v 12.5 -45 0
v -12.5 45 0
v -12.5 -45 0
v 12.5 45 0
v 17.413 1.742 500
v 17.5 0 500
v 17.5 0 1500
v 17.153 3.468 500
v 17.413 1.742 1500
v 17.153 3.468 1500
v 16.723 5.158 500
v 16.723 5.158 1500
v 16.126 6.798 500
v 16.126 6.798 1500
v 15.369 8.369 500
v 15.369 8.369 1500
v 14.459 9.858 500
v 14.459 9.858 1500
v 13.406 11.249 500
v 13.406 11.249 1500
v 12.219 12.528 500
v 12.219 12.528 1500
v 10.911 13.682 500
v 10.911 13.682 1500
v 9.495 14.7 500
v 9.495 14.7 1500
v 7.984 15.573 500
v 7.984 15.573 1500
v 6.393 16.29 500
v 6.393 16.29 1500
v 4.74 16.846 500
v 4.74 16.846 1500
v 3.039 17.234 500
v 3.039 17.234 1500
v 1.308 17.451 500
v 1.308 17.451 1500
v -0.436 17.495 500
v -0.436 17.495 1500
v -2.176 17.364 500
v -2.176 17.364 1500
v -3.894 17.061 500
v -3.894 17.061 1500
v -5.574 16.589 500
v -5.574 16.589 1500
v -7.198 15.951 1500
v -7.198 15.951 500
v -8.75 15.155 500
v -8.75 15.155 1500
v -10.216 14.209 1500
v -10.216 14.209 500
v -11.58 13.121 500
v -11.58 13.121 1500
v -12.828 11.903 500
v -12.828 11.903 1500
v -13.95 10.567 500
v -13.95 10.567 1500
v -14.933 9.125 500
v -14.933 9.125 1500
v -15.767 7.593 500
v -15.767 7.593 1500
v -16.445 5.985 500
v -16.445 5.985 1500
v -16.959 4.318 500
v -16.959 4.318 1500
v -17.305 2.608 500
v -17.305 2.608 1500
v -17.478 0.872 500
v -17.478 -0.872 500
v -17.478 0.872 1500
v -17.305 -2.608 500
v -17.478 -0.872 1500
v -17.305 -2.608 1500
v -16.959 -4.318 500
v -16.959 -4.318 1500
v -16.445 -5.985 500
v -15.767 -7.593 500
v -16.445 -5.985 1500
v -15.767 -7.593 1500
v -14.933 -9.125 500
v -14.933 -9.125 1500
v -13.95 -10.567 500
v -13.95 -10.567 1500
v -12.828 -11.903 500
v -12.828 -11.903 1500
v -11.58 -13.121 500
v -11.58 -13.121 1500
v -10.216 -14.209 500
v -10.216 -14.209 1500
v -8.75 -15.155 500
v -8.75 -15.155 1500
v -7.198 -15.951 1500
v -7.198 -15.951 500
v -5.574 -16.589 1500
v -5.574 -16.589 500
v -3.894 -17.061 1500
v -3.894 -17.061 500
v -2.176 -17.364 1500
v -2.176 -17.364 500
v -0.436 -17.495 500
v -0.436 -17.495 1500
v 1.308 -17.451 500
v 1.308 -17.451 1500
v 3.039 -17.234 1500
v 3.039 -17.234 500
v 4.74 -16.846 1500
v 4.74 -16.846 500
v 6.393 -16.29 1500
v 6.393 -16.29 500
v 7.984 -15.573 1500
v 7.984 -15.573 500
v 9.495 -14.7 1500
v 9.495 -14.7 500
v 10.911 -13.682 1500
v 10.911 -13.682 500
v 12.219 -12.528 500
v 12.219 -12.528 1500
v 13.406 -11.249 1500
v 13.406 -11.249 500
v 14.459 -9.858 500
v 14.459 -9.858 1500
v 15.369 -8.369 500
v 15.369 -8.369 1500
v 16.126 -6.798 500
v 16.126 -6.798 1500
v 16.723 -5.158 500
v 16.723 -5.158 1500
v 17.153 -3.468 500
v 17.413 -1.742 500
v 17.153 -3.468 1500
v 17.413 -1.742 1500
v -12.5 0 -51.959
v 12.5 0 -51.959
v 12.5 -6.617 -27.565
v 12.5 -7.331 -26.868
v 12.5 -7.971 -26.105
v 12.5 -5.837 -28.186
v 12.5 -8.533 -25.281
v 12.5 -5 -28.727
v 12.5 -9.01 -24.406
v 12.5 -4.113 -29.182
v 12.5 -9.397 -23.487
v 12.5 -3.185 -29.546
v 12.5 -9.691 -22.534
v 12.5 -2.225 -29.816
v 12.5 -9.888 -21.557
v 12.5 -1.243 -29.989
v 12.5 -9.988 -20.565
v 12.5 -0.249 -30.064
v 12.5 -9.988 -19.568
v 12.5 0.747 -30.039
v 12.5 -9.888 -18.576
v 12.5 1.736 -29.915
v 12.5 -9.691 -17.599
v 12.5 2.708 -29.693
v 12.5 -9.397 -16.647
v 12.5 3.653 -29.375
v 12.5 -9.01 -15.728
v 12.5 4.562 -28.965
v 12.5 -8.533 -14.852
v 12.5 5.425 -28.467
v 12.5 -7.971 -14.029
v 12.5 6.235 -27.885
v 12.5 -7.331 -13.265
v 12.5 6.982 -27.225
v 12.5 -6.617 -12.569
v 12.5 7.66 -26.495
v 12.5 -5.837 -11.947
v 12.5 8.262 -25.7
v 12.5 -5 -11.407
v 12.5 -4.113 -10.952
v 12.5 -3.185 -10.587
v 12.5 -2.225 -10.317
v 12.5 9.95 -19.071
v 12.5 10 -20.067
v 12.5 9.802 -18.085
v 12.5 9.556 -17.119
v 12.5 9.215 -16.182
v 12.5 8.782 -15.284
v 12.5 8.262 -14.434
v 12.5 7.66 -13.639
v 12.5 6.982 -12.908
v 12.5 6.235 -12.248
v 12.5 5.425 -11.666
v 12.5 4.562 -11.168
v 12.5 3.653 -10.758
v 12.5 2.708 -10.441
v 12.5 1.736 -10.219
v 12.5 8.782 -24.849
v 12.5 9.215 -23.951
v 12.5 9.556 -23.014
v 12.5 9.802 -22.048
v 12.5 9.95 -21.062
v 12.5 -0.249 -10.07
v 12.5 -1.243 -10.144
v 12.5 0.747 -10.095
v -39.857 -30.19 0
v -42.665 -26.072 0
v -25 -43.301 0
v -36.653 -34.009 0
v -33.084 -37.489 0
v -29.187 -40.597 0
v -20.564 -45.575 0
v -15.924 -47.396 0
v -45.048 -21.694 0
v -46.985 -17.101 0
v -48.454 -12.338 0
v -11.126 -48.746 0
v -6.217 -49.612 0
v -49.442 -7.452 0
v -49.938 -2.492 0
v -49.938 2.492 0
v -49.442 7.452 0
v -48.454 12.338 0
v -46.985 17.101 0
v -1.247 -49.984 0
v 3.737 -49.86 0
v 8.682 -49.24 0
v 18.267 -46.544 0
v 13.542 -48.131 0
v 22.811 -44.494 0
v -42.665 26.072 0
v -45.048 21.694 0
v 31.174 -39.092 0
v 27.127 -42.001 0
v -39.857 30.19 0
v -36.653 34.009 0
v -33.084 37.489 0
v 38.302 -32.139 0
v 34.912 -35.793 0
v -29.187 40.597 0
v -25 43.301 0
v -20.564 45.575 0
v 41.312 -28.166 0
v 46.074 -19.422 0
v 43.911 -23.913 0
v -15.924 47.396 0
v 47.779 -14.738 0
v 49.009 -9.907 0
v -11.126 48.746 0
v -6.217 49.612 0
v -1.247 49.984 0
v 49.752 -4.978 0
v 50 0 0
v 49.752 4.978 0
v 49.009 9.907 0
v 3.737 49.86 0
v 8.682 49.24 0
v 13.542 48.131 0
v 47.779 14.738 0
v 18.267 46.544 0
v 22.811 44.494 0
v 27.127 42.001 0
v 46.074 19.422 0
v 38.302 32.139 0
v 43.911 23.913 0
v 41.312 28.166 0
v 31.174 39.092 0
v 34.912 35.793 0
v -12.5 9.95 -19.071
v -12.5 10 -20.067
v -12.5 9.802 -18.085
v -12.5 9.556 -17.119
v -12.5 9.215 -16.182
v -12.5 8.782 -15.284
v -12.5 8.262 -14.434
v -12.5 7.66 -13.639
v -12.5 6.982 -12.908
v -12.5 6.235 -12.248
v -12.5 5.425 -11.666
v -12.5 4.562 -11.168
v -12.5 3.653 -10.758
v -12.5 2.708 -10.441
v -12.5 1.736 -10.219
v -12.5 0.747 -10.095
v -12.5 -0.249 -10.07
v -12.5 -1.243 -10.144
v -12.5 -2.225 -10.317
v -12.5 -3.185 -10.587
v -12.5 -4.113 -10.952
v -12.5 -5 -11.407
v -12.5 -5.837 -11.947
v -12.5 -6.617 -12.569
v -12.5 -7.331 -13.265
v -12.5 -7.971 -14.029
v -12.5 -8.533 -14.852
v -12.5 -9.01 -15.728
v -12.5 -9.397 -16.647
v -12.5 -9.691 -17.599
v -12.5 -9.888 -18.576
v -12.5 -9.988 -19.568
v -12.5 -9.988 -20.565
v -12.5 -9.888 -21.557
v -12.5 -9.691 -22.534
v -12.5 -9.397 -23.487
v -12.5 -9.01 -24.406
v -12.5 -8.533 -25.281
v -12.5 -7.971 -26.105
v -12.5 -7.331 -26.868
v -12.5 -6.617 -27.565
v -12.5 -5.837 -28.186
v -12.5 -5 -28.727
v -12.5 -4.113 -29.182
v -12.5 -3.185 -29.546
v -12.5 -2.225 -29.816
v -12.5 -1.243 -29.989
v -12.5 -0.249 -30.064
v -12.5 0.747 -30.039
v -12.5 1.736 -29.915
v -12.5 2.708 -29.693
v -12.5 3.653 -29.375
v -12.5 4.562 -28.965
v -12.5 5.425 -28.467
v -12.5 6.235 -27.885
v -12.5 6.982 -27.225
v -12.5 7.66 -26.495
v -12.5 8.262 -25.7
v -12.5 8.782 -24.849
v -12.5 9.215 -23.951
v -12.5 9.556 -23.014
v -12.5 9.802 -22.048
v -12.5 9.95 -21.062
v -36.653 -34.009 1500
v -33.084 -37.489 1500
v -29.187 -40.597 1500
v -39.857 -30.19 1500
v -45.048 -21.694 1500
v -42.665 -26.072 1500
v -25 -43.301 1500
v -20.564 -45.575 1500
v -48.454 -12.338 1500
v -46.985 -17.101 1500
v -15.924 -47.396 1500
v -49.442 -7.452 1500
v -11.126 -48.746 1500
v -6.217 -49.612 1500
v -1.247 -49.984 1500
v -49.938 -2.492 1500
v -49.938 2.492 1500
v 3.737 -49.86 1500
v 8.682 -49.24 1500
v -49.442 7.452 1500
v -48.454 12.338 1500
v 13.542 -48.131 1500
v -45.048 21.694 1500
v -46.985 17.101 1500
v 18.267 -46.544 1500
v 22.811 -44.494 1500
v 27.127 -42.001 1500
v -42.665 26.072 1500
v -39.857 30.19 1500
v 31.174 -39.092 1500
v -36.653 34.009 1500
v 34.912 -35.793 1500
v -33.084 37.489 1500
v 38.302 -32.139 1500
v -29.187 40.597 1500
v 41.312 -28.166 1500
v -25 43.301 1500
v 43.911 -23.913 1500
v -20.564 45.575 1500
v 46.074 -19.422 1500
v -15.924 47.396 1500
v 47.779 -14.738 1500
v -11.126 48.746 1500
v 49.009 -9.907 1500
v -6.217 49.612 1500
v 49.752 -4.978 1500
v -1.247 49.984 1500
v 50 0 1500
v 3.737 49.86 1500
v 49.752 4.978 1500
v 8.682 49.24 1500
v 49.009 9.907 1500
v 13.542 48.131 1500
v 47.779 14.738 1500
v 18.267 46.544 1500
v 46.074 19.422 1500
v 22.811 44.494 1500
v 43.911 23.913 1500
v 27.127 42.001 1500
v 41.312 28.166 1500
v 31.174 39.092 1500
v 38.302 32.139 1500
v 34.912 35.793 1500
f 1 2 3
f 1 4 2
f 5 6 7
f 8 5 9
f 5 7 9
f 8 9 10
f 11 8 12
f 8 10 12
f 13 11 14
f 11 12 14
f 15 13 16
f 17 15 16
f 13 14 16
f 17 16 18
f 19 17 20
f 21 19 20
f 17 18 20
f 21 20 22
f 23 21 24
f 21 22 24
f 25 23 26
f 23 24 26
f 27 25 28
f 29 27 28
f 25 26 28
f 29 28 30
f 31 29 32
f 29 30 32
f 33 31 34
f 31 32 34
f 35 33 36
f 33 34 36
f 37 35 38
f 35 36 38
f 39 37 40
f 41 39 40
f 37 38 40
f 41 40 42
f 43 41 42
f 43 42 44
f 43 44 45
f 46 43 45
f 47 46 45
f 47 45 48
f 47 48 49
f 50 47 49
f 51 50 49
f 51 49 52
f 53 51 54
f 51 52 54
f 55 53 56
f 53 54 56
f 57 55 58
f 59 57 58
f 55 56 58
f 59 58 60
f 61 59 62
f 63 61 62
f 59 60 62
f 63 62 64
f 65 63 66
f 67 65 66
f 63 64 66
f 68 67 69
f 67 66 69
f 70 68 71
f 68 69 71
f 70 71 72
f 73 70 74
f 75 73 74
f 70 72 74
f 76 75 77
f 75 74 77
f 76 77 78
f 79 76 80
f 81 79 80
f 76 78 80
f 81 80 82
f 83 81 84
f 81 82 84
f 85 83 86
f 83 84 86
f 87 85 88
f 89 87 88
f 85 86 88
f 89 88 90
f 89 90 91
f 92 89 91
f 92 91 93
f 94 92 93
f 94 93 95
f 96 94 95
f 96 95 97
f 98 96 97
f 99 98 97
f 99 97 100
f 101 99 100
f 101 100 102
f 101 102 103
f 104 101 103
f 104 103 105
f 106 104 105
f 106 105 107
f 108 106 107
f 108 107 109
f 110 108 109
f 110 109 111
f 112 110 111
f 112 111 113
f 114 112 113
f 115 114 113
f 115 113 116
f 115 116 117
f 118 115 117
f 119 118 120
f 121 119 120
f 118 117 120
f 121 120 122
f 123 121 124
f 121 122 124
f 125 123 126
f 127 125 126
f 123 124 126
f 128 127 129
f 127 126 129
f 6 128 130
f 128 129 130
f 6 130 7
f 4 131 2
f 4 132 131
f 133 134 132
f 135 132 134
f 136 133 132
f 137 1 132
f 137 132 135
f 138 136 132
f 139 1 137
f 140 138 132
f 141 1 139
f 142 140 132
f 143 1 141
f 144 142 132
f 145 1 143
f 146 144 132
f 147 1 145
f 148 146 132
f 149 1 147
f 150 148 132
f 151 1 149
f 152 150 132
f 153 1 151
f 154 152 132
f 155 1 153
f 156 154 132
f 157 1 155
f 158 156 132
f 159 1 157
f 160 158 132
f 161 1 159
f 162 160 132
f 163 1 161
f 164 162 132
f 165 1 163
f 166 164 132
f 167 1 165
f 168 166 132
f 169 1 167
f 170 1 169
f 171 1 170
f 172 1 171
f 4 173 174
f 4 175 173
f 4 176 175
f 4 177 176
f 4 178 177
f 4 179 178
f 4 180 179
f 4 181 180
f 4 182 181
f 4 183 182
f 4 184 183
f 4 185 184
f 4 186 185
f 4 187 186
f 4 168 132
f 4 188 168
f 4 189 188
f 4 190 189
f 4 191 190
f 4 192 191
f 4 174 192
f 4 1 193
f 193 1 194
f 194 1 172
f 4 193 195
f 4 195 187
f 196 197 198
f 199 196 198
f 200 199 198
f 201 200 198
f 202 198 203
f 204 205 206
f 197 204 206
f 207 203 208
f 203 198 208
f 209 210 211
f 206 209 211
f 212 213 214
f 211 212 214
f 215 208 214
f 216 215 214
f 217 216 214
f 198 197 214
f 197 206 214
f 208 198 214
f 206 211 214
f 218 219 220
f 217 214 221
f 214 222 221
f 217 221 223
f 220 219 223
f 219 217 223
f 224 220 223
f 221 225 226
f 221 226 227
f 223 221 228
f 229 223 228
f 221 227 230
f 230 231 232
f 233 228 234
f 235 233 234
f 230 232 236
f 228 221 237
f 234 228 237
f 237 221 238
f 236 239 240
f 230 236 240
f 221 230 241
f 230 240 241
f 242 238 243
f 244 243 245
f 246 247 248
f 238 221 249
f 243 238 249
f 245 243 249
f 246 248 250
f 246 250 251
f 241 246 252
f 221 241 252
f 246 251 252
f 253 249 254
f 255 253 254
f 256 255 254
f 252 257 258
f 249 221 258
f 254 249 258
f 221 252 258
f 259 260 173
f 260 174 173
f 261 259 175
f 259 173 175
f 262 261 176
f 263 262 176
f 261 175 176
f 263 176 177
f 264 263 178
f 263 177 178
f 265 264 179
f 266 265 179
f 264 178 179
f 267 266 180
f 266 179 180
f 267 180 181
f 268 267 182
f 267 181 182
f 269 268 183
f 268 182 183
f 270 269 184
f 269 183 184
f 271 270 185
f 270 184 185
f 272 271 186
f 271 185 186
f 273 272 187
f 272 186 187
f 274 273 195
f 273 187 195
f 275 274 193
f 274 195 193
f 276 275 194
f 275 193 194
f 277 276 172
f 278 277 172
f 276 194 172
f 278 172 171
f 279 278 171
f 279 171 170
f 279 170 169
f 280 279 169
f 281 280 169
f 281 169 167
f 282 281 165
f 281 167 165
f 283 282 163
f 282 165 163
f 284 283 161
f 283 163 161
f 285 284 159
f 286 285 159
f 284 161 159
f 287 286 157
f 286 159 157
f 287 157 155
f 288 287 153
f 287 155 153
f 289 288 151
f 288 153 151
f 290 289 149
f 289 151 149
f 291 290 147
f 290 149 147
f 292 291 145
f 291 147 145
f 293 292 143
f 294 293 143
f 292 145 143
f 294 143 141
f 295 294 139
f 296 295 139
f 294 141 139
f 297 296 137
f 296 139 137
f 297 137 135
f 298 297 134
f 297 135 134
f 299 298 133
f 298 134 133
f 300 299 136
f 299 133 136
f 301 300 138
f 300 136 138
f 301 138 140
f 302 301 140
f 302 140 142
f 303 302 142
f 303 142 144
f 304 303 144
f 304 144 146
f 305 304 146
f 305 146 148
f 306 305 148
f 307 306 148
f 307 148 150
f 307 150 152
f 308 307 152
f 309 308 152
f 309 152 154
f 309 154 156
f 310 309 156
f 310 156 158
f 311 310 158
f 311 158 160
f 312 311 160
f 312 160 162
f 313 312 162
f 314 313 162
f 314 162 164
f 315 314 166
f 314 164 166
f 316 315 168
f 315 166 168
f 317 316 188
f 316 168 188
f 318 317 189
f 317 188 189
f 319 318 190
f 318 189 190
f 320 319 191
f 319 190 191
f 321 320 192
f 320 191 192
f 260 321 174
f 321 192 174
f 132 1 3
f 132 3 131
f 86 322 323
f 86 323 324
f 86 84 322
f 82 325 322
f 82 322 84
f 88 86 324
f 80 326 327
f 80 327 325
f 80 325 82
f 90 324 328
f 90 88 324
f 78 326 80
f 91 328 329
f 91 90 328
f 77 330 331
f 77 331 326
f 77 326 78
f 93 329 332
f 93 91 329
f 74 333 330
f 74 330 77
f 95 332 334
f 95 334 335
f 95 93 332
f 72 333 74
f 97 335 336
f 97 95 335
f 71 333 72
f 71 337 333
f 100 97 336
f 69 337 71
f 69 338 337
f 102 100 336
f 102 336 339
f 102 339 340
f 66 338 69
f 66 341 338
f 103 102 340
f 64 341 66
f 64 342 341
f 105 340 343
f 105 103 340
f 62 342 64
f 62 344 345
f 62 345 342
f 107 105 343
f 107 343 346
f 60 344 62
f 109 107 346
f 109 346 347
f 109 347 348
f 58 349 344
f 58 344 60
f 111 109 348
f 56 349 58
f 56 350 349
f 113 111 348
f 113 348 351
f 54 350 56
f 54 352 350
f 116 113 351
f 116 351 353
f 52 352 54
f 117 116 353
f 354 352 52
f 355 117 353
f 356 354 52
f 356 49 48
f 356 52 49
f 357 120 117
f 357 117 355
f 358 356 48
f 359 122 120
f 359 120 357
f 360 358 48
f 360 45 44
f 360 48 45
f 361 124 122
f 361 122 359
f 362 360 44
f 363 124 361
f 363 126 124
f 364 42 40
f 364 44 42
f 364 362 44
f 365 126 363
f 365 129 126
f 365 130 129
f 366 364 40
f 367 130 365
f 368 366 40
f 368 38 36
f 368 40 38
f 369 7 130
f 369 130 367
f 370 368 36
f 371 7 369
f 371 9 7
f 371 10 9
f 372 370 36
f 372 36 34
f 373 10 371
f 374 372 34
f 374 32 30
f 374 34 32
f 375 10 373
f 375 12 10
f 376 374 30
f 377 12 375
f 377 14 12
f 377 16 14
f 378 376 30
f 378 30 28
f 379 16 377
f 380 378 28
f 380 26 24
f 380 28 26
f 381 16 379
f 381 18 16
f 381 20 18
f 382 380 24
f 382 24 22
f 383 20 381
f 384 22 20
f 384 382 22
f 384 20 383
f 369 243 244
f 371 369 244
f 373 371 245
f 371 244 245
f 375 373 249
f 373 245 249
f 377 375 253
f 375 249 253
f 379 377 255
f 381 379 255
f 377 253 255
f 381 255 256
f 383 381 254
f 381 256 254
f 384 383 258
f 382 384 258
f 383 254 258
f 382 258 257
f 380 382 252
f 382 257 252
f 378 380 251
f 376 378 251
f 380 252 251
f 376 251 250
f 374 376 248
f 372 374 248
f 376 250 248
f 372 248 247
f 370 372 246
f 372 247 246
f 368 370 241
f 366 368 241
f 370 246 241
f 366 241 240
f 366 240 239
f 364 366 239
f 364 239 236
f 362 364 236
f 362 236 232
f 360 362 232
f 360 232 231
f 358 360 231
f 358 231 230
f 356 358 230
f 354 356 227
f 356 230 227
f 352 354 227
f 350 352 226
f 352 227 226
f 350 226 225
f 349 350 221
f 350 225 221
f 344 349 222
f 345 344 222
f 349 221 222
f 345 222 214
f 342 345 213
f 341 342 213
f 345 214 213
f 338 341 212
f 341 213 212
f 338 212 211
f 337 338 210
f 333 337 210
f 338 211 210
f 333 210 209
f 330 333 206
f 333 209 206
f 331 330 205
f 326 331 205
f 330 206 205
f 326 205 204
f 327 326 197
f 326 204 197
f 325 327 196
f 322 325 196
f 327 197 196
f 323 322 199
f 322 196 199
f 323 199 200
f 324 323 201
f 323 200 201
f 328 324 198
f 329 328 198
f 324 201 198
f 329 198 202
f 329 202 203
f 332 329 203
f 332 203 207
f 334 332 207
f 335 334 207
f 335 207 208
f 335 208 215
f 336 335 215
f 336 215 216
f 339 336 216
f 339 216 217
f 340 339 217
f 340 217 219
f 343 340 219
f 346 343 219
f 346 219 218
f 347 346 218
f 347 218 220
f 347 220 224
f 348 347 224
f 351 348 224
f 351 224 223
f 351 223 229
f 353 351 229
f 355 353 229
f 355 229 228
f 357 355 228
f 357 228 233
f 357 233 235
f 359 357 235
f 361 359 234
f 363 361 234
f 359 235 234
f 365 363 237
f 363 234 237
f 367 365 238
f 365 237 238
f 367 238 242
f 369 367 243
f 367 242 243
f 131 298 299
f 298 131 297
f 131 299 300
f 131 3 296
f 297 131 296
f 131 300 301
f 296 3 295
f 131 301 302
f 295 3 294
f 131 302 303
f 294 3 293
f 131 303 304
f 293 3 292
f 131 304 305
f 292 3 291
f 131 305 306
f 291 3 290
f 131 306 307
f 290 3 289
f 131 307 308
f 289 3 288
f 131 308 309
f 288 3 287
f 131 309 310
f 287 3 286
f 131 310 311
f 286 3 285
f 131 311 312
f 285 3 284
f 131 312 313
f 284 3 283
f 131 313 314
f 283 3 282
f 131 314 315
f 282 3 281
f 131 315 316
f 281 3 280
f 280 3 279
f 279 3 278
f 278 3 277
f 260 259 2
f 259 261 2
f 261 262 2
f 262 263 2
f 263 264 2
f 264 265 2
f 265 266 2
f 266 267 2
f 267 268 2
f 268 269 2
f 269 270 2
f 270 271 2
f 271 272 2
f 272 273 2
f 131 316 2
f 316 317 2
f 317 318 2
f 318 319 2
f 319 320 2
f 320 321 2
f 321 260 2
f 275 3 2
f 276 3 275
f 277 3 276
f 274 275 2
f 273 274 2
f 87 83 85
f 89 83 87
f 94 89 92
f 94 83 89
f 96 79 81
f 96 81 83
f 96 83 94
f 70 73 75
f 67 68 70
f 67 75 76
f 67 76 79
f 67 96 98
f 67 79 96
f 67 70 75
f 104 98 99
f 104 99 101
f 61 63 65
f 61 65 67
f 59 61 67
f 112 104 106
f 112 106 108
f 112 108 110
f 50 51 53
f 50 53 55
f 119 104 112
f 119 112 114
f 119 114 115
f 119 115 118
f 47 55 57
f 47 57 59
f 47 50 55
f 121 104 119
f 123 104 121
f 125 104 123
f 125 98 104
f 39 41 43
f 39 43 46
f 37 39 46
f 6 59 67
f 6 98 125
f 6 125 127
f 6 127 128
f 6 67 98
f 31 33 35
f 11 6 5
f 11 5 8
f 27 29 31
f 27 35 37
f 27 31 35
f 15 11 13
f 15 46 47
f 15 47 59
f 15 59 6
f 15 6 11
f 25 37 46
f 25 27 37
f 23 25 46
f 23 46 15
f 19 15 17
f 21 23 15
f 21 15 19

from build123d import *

# Parameters (mm, degrees)
F0_R     = 50
F1_DEPTH = 1500
F2_R     = 17.5
F3_DEPTH = 1000
F5_DEPTH = 12.5
F6_R     = 10
F7_DEPTH = 12.5


with BuildPart() as f1:
    # F0 (on Top) → F1 (new body)
    with BuildSketch(Plane.XY):
        Circle(F0_R)
    extrude(amount=F1_DEPTH)

    # F2 (on face) → F3 (cut)
    with BuildSketch(Plane.XY.offset(1500)):
        Circle(F2_R)
    extrude(amount=-F3_DEPTH, mode=Mode.SUBTRACT)


with BuildPart() as f5:
    # F4 (on Right) → F5 (new body, symmetric)
    with BuildSketch(Plane.YZ):
        Polygon((45, 0), (-45, 0), (0, -51.95892), align=None)
    extrude(amount=F5_DEPTH, both=True)

    # F6 (on Right) → F7 (cut, symmetric)
    with BuildSketch(Plane.YZ):
        with Locations((0, -20.066756)):
            Circle(F6_R)
    extrude(amount=F7_DEPTH, both=True, mode=Mode.SUBTRACT)


solid = Compound([f1.part, f5.part])
